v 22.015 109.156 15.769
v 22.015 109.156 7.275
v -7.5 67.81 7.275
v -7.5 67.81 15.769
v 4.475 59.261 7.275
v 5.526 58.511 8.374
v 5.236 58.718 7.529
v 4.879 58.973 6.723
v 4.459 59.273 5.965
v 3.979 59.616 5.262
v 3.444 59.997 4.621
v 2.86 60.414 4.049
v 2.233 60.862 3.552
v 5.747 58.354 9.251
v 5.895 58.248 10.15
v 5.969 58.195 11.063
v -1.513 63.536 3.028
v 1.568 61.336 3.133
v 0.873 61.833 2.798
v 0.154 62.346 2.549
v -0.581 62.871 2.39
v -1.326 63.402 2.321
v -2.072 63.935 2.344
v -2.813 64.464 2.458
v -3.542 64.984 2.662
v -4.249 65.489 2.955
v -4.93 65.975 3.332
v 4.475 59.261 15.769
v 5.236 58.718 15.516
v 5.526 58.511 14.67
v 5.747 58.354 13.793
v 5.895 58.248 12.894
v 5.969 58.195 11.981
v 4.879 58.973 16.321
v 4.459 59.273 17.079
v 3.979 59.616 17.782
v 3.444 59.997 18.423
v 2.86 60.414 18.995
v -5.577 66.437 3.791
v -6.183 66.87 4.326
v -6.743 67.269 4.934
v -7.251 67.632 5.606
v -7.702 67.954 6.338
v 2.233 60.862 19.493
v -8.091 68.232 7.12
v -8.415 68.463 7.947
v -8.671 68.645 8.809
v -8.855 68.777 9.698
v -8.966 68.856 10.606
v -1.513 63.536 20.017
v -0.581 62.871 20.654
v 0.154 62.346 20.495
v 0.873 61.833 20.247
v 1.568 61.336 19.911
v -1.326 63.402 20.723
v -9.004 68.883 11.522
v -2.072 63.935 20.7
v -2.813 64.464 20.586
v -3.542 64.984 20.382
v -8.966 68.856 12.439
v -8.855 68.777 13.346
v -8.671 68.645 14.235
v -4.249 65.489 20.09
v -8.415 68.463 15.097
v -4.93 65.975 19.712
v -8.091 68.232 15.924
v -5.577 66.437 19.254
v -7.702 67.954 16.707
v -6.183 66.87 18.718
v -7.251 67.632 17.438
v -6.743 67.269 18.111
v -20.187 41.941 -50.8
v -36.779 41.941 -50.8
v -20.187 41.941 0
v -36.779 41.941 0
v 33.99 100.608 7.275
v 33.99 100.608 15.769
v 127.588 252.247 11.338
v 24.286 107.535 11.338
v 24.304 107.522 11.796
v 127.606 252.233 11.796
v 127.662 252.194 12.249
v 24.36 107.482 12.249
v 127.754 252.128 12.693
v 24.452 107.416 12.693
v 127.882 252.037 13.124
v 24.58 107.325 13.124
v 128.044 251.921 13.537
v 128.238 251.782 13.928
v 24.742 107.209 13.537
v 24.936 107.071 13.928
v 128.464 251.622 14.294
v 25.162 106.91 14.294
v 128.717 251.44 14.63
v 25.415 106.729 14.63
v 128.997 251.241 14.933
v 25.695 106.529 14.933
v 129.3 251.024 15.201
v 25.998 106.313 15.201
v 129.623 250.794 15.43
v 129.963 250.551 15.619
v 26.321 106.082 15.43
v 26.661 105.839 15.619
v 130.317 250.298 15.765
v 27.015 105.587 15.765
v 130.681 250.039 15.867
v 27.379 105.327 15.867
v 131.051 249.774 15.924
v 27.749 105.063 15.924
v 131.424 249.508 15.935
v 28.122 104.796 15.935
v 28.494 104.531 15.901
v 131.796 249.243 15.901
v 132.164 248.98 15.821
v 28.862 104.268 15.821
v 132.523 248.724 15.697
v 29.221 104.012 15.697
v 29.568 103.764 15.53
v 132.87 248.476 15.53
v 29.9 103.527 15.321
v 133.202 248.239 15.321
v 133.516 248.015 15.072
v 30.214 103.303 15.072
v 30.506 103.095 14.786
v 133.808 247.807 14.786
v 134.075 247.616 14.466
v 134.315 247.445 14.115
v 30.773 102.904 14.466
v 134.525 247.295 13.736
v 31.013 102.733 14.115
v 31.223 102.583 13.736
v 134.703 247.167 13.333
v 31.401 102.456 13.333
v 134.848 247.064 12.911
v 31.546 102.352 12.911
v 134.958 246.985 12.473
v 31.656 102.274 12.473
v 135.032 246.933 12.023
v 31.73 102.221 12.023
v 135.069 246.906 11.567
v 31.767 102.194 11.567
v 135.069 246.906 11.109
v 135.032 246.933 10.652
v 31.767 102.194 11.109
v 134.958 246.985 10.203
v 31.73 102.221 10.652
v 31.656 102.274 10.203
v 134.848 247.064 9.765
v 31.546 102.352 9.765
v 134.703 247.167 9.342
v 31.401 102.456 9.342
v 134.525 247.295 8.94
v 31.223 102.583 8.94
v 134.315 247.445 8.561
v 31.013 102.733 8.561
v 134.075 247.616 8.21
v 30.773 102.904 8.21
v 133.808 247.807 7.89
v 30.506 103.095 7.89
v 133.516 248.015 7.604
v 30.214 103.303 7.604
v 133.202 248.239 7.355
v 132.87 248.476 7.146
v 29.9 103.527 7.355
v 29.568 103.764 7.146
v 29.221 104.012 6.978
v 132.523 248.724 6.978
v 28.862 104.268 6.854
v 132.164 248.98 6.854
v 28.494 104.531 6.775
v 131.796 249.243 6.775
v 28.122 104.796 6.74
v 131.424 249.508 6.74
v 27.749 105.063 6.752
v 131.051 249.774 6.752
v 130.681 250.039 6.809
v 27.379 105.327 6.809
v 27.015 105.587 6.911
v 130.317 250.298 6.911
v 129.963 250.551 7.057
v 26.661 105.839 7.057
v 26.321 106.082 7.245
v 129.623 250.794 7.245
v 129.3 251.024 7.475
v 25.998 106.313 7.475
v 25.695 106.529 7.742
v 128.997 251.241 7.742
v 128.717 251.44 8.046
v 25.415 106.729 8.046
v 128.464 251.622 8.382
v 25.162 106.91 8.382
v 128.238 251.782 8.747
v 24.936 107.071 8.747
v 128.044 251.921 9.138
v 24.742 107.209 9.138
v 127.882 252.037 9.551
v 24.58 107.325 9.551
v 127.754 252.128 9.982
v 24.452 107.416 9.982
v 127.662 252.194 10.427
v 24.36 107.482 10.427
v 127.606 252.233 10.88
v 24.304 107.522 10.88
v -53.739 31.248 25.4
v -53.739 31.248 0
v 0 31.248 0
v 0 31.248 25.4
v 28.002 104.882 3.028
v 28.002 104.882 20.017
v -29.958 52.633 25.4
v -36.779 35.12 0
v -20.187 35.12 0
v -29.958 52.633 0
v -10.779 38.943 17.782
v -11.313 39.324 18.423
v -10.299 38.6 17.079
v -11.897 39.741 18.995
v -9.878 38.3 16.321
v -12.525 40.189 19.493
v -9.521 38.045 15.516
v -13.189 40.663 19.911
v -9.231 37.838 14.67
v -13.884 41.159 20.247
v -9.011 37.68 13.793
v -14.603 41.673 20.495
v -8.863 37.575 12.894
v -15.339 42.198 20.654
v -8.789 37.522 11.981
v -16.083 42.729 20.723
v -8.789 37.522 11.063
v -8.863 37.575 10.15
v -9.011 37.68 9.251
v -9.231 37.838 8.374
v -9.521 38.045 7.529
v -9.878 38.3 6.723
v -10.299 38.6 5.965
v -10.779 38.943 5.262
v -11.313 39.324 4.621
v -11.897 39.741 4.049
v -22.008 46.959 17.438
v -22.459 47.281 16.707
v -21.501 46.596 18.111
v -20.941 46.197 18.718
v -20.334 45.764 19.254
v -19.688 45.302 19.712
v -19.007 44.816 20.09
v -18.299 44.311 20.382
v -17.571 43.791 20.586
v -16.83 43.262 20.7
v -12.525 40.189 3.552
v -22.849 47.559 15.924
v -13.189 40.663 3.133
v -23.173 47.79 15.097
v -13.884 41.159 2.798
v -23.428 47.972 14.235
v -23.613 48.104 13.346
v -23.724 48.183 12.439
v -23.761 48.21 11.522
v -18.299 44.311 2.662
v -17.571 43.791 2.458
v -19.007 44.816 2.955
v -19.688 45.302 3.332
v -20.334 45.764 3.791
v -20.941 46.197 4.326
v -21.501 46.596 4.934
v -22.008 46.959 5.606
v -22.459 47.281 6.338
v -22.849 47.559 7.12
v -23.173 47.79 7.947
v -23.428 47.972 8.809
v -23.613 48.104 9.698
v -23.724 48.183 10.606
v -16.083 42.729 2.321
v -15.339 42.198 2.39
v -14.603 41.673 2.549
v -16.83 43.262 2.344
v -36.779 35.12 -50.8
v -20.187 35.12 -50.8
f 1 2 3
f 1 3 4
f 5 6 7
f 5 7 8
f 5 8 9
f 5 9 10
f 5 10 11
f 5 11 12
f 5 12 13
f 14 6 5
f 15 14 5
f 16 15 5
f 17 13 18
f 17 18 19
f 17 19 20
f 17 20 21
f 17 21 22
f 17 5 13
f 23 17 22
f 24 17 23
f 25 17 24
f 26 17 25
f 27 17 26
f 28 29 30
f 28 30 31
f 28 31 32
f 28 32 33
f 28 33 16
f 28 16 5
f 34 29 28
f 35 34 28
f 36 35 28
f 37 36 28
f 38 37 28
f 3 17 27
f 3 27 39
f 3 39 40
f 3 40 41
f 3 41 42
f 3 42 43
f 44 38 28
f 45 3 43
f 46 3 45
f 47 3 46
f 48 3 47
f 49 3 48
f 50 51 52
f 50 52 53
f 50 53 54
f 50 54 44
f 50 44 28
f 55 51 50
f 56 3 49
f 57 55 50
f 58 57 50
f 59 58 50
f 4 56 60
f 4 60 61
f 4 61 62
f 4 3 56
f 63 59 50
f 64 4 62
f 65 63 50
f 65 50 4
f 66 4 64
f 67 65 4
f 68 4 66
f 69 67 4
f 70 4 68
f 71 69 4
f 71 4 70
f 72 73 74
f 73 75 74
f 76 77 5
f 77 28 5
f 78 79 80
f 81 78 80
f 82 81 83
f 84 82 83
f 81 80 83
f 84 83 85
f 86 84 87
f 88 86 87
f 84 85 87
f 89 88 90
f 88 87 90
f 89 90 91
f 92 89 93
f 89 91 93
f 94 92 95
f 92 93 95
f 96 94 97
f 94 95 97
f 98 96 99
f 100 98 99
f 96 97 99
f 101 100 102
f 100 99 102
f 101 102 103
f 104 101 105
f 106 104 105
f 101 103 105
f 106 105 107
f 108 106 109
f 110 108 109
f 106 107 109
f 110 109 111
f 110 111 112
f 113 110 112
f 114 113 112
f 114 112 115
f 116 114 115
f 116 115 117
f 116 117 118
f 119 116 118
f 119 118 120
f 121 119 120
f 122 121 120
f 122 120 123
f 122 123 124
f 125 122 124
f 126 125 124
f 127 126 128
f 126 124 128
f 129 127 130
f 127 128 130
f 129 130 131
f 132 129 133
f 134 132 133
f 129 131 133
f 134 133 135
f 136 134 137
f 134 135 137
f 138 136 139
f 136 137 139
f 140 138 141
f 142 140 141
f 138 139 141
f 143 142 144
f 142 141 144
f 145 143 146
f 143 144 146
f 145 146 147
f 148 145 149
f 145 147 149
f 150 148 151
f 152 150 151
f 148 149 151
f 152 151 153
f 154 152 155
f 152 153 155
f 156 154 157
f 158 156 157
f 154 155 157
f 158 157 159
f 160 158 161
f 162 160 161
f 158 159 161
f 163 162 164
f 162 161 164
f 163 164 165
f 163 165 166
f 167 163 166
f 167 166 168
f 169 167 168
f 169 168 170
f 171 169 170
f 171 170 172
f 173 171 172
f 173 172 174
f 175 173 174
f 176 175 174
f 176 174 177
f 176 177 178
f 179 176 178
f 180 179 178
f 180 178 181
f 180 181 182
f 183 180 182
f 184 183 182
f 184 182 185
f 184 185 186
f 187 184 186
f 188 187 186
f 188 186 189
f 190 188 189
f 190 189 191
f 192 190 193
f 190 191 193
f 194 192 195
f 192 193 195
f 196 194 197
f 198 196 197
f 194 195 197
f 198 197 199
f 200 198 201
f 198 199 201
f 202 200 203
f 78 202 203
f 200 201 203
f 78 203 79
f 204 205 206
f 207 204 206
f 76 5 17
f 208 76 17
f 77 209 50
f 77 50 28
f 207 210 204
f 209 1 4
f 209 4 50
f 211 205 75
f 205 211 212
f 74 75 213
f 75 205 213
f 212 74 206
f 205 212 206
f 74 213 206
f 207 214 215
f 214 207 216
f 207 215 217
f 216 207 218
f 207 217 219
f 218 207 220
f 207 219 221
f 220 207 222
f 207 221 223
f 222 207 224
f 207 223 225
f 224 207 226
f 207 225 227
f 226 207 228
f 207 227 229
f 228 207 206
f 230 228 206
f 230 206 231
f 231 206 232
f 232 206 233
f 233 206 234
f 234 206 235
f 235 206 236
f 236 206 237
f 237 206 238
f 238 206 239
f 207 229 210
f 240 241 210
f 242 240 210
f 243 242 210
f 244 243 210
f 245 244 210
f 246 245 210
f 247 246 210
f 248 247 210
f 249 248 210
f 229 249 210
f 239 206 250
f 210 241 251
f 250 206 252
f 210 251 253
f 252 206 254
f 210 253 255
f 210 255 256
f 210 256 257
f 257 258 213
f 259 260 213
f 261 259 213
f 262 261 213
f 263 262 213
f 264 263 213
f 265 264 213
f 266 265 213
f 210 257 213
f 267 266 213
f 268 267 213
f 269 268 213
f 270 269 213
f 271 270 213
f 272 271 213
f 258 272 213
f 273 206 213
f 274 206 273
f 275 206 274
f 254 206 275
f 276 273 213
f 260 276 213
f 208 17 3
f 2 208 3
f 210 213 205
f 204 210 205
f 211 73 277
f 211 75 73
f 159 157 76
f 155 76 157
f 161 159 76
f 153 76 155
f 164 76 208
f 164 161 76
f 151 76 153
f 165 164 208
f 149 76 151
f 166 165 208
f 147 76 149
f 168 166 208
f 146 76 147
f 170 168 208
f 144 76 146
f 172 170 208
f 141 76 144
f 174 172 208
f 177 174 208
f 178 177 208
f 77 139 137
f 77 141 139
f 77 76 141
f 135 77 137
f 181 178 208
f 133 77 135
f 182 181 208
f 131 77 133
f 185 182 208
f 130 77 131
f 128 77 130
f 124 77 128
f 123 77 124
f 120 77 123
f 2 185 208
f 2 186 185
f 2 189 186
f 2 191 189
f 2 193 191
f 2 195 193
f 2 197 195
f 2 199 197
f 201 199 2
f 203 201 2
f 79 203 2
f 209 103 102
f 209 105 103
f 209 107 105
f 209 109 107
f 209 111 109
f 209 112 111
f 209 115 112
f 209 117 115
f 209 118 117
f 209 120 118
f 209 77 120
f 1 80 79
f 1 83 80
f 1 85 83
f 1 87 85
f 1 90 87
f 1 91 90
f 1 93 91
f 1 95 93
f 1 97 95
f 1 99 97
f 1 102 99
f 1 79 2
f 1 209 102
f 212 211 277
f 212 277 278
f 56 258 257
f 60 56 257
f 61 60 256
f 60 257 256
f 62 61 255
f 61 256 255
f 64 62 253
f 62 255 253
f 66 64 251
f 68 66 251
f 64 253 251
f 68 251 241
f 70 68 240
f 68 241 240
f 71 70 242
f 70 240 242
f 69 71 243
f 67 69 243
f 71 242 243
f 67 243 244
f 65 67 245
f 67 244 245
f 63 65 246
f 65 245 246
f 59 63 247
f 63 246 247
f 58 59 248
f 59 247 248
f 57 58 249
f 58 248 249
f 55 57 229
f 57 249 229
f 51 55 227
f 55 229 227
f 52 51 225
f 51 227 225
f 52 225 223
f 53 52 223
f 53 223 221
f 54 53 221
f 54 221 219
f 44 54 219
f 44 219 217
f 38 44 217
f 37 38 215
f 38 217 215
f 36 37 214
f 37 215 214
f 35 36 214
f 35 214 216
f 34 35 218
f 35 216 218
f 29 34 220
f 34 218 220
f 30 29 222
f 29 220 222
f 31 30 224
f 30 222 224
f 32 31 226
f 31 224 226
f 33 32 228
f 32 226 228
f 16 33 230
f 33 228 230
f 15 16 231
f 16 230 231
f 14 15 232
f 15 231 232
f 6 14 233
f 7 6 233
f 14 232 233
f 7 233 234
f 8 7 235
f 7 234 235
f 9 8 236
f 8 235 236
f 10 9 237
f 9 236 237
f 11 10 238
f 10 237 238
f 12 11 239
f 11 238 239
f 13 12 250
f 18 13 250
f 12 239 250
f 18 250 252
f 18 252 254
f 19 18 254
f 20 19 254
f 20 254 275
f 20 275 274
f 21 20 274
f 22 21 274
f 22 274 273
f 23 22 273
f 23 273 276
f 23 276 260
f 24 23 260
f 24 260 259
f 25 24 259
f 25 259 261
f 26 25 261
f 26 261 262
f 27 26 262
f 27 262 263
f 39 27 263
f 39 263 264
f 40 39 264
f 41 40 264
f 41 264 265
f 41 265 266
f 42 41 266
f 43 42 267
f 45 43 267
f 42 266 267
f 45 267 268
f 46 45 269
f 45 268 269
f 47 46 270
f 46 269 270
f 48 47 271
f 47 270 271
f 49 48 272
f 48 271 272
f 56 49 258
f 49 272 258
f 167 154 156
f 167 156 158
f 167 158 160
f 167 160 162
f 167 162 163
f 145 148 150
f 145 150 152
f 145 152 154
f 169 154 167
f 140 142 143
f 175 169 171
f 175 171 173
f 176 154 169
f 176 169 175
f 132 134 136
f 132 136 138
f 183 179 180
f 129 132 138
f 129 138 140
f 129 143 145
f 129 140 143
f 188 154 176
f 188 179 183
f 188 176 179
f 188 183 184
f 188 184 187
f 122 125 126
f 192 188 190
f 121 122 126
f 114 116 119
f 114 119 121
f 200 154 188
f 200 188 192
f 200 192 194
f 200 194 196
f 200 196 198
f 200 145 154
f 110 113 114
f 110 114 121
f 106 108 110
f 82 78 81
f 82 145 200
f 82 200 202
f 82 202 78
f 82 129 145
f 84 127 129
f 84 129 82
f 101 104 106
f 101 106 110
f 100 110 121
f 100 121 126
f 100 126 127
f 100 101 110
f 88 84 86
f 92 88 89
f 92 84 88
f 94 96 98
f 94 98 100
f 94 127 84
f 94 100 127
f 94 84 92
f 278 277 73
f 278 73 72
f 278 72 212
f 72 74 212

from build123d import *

# Parameters (mm, degrees)
F1_DEPTH  = 25.4
F2_R      = 9.2037028664
F3_DEPTH  = 25.4
F4_W      = 16.5919382125
F4_H      = 6.8211294711
F5_DEPTH  = 25.4
F6_DEPTH  = 25.4
F8_DEPTH  = 25.4
F9_DEPTH  = 25.4
F10_R     = 4.5988805072
F11_DEPTH = 177.8


with BuildPart() as f1:
    # F0 (on Top) → F1 (new body)
    with BuildSketch(Plane.XY):
        Polygon((-29.9576614052, 52.6333078742), (-53.7394359708, 31.2481448054), (-41.9407263398, 31.2481448054), (-25.5331452936, 42.3094369471), align=None)
        Polygon((-23.8739512861, 35.303954035), (-41.9407263398, 31.2481448054), (0, 31.2481448054), align=None)
        Polygon((-25.5331452936, 42.3094369471), (-41.9407263398, 31.2481448054), (-23.8739512861, 35.303954035), align=None)
        Polygon((0, 31.2481448054), (-29.9576614052, 52.6333078742), (-25.5331452936, 42.3094369471), align=None)
        Polygon((-23.8739512861, 35.303954035), (0, 31.2481448054), (-25.5331452936, 42.3094369471), align=None)
    extrude(amount=F1_DEPTH)

    # F2 (on face) → F3 (join)
    with BuildSketch(Plane(origin=(14.7765754508, 20.6999424161, 0), x_dir=(-0.8139026255, 0.5810013049, 0), z_dir=(0.5810013049, 0.8139026255, 0))):
        with Locations((38.1454527378, 11.5221776068)):
            Circle(F2_R)
    extrude(amount=F3_DEPTH)

    # F4 (on face) → F5 (join)
    with BuildSketch(Plane(origin=(0, 0, 0), x_dir=(1, 0, 0), z_dir=(0, 0, -1))):
        with Locations((-28.4828236327, -38.5301616043)):
            Rectangle(F4_W, F4_H)
    extrude(amount=F5_DEPTH)

    # F6 (add): a face of the model
    f6_faces = [f1.faces().sort_by_distance(p)[0] for p in [
        (-28.4828236327, 38.5301616043, -25.4),
    ]]
    extrude(f6_faces, amount=F6_DEPTH)

    # F7 (on face) → F8 (join)
    with BuildSketch(Plane(origin=(29.5340085947, 41.3730691028, 0), x_dir=(-0.8139026255, 0.5810013049, 0), z_dir=(0.5810013049, 0.8139026255, 0))):
        Polygon((45.5019623041, 7.2748948284), (45.5019623041, 15.7694603852), (38.1454527378, 20.0167431636), (30.7889431715, 15.7694603852), (30.7889431715, 7.2748948284), (38.1454527378, 3.02761205), align=None)
    extrude(amount=F8_DEPTH)

    # F9 (add): a face of the model
    f9_faces = [f1.faces().sort_by_distance(p)[0] for p in [
        (13.244757606, 84.2087536053, 11.5221776068),
    ]]
    extrude(f9_faces, amount=F9_DEPTH)

    # F10 (on face) → F11 (join)
    with BuildSketch(Plane(origin=(59.0488748825, 82.7193224761, 0), x_dir=(-0.8139026255, 0.5810013049, 0), z_dir=(0.5810013049, 0.8139026255, 0))):
        with Locations((38.1127148867, 11.3378223032)):
            Circle(F10_R)
    extrude(amount=F11_DEPTH)


solid = f1.part
